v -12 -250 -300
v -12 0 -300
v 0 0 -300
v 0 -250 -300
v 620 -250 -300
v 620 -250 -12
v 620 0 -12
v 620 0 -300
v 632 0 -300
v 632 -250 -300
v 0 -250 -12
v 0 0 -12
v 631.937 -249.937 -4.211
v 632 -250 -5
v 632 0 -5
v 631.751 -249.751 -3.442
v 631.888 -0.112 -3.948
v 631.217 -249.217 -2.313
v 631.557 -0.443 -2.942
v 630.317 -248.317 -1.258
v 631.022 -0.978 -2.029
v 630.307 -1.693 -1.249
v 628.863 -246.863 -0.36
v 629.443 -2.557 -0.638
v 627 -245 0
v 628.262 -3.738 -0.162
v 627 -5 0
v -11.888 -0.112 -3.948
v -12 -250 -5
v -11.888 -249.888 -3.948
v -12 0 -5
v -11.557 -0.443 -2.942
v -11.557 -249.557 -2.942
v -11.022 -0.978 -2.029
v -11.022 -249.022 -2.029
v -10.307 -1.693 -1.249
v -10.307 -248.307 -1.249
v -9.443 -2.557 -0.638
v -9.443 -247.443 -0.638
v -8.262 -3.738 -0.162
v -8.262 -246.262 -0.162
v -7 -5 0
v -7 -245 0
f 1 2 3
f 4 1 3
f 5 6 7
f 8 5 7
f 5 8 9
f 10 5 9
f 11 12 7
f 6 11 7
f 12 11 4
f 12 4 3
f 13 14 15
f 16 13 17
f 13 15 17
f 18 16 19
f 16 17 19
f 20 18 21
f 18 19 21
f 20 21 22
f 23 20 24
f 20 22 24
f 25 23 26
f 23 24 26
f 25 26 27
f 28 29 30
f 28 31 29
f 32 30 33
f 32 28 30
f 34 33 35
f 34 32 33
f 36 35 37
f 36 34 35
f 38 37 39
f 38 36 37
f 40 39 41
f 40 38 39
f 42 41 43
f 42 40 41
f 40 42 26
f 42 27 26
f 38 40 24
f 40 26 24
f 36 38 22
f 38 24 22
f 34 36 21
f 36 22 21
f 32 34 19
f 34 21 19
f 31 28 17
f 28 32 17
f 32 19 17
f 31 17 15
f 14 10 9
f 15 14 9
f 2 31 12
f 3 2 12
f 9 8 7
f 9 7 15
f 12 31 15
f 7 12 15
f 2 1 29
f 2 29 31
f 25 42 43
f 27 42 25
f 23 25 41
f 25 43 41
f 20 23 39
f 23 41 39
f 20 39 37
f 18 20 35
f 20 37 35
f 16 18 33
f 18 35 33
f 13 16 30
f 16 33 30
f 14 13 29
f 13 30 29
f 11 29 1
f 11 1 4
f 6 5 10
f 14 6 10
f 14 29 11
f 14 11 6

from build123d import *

# Parameters (mm, degrees)
F0_W     = 620
F0_H     = 250
F1_DEPTH = 12
F2_W     = 12
F2_H     = 250
F3_DEPTH = 300
F4_R     = 5


with BuildPart() as f1:
    # F0 (on Top) → F1 (new body)
    with BuildSketch(Plane.XY):
        with Locations((310, -125)):
            Rectangle(F0_W, F0_H)
    extrude(amount=-F1_DEPTH)

    # F2 (on Top) → F3 (join)
    with BuildSketch(Plane.XY):
        with Locations((-6, -125)):
            Rectangle(F2_W, F2_H)
        with Locations((626, -125)):
            Rectangle(F2_W, F2_H)
    extrude(amount=-F3_DEPTH)

    # F4
    f4_edges = [f1.edges().sort_by_distance(p)[0] for p in [
        (-12, -125, 0),
        (310, -250, 0),
        (632, -125, 0),
        (310, 0, 0),
    ]]
    fillet(f4_edges, radius=F4_R)


solid = f1.part
